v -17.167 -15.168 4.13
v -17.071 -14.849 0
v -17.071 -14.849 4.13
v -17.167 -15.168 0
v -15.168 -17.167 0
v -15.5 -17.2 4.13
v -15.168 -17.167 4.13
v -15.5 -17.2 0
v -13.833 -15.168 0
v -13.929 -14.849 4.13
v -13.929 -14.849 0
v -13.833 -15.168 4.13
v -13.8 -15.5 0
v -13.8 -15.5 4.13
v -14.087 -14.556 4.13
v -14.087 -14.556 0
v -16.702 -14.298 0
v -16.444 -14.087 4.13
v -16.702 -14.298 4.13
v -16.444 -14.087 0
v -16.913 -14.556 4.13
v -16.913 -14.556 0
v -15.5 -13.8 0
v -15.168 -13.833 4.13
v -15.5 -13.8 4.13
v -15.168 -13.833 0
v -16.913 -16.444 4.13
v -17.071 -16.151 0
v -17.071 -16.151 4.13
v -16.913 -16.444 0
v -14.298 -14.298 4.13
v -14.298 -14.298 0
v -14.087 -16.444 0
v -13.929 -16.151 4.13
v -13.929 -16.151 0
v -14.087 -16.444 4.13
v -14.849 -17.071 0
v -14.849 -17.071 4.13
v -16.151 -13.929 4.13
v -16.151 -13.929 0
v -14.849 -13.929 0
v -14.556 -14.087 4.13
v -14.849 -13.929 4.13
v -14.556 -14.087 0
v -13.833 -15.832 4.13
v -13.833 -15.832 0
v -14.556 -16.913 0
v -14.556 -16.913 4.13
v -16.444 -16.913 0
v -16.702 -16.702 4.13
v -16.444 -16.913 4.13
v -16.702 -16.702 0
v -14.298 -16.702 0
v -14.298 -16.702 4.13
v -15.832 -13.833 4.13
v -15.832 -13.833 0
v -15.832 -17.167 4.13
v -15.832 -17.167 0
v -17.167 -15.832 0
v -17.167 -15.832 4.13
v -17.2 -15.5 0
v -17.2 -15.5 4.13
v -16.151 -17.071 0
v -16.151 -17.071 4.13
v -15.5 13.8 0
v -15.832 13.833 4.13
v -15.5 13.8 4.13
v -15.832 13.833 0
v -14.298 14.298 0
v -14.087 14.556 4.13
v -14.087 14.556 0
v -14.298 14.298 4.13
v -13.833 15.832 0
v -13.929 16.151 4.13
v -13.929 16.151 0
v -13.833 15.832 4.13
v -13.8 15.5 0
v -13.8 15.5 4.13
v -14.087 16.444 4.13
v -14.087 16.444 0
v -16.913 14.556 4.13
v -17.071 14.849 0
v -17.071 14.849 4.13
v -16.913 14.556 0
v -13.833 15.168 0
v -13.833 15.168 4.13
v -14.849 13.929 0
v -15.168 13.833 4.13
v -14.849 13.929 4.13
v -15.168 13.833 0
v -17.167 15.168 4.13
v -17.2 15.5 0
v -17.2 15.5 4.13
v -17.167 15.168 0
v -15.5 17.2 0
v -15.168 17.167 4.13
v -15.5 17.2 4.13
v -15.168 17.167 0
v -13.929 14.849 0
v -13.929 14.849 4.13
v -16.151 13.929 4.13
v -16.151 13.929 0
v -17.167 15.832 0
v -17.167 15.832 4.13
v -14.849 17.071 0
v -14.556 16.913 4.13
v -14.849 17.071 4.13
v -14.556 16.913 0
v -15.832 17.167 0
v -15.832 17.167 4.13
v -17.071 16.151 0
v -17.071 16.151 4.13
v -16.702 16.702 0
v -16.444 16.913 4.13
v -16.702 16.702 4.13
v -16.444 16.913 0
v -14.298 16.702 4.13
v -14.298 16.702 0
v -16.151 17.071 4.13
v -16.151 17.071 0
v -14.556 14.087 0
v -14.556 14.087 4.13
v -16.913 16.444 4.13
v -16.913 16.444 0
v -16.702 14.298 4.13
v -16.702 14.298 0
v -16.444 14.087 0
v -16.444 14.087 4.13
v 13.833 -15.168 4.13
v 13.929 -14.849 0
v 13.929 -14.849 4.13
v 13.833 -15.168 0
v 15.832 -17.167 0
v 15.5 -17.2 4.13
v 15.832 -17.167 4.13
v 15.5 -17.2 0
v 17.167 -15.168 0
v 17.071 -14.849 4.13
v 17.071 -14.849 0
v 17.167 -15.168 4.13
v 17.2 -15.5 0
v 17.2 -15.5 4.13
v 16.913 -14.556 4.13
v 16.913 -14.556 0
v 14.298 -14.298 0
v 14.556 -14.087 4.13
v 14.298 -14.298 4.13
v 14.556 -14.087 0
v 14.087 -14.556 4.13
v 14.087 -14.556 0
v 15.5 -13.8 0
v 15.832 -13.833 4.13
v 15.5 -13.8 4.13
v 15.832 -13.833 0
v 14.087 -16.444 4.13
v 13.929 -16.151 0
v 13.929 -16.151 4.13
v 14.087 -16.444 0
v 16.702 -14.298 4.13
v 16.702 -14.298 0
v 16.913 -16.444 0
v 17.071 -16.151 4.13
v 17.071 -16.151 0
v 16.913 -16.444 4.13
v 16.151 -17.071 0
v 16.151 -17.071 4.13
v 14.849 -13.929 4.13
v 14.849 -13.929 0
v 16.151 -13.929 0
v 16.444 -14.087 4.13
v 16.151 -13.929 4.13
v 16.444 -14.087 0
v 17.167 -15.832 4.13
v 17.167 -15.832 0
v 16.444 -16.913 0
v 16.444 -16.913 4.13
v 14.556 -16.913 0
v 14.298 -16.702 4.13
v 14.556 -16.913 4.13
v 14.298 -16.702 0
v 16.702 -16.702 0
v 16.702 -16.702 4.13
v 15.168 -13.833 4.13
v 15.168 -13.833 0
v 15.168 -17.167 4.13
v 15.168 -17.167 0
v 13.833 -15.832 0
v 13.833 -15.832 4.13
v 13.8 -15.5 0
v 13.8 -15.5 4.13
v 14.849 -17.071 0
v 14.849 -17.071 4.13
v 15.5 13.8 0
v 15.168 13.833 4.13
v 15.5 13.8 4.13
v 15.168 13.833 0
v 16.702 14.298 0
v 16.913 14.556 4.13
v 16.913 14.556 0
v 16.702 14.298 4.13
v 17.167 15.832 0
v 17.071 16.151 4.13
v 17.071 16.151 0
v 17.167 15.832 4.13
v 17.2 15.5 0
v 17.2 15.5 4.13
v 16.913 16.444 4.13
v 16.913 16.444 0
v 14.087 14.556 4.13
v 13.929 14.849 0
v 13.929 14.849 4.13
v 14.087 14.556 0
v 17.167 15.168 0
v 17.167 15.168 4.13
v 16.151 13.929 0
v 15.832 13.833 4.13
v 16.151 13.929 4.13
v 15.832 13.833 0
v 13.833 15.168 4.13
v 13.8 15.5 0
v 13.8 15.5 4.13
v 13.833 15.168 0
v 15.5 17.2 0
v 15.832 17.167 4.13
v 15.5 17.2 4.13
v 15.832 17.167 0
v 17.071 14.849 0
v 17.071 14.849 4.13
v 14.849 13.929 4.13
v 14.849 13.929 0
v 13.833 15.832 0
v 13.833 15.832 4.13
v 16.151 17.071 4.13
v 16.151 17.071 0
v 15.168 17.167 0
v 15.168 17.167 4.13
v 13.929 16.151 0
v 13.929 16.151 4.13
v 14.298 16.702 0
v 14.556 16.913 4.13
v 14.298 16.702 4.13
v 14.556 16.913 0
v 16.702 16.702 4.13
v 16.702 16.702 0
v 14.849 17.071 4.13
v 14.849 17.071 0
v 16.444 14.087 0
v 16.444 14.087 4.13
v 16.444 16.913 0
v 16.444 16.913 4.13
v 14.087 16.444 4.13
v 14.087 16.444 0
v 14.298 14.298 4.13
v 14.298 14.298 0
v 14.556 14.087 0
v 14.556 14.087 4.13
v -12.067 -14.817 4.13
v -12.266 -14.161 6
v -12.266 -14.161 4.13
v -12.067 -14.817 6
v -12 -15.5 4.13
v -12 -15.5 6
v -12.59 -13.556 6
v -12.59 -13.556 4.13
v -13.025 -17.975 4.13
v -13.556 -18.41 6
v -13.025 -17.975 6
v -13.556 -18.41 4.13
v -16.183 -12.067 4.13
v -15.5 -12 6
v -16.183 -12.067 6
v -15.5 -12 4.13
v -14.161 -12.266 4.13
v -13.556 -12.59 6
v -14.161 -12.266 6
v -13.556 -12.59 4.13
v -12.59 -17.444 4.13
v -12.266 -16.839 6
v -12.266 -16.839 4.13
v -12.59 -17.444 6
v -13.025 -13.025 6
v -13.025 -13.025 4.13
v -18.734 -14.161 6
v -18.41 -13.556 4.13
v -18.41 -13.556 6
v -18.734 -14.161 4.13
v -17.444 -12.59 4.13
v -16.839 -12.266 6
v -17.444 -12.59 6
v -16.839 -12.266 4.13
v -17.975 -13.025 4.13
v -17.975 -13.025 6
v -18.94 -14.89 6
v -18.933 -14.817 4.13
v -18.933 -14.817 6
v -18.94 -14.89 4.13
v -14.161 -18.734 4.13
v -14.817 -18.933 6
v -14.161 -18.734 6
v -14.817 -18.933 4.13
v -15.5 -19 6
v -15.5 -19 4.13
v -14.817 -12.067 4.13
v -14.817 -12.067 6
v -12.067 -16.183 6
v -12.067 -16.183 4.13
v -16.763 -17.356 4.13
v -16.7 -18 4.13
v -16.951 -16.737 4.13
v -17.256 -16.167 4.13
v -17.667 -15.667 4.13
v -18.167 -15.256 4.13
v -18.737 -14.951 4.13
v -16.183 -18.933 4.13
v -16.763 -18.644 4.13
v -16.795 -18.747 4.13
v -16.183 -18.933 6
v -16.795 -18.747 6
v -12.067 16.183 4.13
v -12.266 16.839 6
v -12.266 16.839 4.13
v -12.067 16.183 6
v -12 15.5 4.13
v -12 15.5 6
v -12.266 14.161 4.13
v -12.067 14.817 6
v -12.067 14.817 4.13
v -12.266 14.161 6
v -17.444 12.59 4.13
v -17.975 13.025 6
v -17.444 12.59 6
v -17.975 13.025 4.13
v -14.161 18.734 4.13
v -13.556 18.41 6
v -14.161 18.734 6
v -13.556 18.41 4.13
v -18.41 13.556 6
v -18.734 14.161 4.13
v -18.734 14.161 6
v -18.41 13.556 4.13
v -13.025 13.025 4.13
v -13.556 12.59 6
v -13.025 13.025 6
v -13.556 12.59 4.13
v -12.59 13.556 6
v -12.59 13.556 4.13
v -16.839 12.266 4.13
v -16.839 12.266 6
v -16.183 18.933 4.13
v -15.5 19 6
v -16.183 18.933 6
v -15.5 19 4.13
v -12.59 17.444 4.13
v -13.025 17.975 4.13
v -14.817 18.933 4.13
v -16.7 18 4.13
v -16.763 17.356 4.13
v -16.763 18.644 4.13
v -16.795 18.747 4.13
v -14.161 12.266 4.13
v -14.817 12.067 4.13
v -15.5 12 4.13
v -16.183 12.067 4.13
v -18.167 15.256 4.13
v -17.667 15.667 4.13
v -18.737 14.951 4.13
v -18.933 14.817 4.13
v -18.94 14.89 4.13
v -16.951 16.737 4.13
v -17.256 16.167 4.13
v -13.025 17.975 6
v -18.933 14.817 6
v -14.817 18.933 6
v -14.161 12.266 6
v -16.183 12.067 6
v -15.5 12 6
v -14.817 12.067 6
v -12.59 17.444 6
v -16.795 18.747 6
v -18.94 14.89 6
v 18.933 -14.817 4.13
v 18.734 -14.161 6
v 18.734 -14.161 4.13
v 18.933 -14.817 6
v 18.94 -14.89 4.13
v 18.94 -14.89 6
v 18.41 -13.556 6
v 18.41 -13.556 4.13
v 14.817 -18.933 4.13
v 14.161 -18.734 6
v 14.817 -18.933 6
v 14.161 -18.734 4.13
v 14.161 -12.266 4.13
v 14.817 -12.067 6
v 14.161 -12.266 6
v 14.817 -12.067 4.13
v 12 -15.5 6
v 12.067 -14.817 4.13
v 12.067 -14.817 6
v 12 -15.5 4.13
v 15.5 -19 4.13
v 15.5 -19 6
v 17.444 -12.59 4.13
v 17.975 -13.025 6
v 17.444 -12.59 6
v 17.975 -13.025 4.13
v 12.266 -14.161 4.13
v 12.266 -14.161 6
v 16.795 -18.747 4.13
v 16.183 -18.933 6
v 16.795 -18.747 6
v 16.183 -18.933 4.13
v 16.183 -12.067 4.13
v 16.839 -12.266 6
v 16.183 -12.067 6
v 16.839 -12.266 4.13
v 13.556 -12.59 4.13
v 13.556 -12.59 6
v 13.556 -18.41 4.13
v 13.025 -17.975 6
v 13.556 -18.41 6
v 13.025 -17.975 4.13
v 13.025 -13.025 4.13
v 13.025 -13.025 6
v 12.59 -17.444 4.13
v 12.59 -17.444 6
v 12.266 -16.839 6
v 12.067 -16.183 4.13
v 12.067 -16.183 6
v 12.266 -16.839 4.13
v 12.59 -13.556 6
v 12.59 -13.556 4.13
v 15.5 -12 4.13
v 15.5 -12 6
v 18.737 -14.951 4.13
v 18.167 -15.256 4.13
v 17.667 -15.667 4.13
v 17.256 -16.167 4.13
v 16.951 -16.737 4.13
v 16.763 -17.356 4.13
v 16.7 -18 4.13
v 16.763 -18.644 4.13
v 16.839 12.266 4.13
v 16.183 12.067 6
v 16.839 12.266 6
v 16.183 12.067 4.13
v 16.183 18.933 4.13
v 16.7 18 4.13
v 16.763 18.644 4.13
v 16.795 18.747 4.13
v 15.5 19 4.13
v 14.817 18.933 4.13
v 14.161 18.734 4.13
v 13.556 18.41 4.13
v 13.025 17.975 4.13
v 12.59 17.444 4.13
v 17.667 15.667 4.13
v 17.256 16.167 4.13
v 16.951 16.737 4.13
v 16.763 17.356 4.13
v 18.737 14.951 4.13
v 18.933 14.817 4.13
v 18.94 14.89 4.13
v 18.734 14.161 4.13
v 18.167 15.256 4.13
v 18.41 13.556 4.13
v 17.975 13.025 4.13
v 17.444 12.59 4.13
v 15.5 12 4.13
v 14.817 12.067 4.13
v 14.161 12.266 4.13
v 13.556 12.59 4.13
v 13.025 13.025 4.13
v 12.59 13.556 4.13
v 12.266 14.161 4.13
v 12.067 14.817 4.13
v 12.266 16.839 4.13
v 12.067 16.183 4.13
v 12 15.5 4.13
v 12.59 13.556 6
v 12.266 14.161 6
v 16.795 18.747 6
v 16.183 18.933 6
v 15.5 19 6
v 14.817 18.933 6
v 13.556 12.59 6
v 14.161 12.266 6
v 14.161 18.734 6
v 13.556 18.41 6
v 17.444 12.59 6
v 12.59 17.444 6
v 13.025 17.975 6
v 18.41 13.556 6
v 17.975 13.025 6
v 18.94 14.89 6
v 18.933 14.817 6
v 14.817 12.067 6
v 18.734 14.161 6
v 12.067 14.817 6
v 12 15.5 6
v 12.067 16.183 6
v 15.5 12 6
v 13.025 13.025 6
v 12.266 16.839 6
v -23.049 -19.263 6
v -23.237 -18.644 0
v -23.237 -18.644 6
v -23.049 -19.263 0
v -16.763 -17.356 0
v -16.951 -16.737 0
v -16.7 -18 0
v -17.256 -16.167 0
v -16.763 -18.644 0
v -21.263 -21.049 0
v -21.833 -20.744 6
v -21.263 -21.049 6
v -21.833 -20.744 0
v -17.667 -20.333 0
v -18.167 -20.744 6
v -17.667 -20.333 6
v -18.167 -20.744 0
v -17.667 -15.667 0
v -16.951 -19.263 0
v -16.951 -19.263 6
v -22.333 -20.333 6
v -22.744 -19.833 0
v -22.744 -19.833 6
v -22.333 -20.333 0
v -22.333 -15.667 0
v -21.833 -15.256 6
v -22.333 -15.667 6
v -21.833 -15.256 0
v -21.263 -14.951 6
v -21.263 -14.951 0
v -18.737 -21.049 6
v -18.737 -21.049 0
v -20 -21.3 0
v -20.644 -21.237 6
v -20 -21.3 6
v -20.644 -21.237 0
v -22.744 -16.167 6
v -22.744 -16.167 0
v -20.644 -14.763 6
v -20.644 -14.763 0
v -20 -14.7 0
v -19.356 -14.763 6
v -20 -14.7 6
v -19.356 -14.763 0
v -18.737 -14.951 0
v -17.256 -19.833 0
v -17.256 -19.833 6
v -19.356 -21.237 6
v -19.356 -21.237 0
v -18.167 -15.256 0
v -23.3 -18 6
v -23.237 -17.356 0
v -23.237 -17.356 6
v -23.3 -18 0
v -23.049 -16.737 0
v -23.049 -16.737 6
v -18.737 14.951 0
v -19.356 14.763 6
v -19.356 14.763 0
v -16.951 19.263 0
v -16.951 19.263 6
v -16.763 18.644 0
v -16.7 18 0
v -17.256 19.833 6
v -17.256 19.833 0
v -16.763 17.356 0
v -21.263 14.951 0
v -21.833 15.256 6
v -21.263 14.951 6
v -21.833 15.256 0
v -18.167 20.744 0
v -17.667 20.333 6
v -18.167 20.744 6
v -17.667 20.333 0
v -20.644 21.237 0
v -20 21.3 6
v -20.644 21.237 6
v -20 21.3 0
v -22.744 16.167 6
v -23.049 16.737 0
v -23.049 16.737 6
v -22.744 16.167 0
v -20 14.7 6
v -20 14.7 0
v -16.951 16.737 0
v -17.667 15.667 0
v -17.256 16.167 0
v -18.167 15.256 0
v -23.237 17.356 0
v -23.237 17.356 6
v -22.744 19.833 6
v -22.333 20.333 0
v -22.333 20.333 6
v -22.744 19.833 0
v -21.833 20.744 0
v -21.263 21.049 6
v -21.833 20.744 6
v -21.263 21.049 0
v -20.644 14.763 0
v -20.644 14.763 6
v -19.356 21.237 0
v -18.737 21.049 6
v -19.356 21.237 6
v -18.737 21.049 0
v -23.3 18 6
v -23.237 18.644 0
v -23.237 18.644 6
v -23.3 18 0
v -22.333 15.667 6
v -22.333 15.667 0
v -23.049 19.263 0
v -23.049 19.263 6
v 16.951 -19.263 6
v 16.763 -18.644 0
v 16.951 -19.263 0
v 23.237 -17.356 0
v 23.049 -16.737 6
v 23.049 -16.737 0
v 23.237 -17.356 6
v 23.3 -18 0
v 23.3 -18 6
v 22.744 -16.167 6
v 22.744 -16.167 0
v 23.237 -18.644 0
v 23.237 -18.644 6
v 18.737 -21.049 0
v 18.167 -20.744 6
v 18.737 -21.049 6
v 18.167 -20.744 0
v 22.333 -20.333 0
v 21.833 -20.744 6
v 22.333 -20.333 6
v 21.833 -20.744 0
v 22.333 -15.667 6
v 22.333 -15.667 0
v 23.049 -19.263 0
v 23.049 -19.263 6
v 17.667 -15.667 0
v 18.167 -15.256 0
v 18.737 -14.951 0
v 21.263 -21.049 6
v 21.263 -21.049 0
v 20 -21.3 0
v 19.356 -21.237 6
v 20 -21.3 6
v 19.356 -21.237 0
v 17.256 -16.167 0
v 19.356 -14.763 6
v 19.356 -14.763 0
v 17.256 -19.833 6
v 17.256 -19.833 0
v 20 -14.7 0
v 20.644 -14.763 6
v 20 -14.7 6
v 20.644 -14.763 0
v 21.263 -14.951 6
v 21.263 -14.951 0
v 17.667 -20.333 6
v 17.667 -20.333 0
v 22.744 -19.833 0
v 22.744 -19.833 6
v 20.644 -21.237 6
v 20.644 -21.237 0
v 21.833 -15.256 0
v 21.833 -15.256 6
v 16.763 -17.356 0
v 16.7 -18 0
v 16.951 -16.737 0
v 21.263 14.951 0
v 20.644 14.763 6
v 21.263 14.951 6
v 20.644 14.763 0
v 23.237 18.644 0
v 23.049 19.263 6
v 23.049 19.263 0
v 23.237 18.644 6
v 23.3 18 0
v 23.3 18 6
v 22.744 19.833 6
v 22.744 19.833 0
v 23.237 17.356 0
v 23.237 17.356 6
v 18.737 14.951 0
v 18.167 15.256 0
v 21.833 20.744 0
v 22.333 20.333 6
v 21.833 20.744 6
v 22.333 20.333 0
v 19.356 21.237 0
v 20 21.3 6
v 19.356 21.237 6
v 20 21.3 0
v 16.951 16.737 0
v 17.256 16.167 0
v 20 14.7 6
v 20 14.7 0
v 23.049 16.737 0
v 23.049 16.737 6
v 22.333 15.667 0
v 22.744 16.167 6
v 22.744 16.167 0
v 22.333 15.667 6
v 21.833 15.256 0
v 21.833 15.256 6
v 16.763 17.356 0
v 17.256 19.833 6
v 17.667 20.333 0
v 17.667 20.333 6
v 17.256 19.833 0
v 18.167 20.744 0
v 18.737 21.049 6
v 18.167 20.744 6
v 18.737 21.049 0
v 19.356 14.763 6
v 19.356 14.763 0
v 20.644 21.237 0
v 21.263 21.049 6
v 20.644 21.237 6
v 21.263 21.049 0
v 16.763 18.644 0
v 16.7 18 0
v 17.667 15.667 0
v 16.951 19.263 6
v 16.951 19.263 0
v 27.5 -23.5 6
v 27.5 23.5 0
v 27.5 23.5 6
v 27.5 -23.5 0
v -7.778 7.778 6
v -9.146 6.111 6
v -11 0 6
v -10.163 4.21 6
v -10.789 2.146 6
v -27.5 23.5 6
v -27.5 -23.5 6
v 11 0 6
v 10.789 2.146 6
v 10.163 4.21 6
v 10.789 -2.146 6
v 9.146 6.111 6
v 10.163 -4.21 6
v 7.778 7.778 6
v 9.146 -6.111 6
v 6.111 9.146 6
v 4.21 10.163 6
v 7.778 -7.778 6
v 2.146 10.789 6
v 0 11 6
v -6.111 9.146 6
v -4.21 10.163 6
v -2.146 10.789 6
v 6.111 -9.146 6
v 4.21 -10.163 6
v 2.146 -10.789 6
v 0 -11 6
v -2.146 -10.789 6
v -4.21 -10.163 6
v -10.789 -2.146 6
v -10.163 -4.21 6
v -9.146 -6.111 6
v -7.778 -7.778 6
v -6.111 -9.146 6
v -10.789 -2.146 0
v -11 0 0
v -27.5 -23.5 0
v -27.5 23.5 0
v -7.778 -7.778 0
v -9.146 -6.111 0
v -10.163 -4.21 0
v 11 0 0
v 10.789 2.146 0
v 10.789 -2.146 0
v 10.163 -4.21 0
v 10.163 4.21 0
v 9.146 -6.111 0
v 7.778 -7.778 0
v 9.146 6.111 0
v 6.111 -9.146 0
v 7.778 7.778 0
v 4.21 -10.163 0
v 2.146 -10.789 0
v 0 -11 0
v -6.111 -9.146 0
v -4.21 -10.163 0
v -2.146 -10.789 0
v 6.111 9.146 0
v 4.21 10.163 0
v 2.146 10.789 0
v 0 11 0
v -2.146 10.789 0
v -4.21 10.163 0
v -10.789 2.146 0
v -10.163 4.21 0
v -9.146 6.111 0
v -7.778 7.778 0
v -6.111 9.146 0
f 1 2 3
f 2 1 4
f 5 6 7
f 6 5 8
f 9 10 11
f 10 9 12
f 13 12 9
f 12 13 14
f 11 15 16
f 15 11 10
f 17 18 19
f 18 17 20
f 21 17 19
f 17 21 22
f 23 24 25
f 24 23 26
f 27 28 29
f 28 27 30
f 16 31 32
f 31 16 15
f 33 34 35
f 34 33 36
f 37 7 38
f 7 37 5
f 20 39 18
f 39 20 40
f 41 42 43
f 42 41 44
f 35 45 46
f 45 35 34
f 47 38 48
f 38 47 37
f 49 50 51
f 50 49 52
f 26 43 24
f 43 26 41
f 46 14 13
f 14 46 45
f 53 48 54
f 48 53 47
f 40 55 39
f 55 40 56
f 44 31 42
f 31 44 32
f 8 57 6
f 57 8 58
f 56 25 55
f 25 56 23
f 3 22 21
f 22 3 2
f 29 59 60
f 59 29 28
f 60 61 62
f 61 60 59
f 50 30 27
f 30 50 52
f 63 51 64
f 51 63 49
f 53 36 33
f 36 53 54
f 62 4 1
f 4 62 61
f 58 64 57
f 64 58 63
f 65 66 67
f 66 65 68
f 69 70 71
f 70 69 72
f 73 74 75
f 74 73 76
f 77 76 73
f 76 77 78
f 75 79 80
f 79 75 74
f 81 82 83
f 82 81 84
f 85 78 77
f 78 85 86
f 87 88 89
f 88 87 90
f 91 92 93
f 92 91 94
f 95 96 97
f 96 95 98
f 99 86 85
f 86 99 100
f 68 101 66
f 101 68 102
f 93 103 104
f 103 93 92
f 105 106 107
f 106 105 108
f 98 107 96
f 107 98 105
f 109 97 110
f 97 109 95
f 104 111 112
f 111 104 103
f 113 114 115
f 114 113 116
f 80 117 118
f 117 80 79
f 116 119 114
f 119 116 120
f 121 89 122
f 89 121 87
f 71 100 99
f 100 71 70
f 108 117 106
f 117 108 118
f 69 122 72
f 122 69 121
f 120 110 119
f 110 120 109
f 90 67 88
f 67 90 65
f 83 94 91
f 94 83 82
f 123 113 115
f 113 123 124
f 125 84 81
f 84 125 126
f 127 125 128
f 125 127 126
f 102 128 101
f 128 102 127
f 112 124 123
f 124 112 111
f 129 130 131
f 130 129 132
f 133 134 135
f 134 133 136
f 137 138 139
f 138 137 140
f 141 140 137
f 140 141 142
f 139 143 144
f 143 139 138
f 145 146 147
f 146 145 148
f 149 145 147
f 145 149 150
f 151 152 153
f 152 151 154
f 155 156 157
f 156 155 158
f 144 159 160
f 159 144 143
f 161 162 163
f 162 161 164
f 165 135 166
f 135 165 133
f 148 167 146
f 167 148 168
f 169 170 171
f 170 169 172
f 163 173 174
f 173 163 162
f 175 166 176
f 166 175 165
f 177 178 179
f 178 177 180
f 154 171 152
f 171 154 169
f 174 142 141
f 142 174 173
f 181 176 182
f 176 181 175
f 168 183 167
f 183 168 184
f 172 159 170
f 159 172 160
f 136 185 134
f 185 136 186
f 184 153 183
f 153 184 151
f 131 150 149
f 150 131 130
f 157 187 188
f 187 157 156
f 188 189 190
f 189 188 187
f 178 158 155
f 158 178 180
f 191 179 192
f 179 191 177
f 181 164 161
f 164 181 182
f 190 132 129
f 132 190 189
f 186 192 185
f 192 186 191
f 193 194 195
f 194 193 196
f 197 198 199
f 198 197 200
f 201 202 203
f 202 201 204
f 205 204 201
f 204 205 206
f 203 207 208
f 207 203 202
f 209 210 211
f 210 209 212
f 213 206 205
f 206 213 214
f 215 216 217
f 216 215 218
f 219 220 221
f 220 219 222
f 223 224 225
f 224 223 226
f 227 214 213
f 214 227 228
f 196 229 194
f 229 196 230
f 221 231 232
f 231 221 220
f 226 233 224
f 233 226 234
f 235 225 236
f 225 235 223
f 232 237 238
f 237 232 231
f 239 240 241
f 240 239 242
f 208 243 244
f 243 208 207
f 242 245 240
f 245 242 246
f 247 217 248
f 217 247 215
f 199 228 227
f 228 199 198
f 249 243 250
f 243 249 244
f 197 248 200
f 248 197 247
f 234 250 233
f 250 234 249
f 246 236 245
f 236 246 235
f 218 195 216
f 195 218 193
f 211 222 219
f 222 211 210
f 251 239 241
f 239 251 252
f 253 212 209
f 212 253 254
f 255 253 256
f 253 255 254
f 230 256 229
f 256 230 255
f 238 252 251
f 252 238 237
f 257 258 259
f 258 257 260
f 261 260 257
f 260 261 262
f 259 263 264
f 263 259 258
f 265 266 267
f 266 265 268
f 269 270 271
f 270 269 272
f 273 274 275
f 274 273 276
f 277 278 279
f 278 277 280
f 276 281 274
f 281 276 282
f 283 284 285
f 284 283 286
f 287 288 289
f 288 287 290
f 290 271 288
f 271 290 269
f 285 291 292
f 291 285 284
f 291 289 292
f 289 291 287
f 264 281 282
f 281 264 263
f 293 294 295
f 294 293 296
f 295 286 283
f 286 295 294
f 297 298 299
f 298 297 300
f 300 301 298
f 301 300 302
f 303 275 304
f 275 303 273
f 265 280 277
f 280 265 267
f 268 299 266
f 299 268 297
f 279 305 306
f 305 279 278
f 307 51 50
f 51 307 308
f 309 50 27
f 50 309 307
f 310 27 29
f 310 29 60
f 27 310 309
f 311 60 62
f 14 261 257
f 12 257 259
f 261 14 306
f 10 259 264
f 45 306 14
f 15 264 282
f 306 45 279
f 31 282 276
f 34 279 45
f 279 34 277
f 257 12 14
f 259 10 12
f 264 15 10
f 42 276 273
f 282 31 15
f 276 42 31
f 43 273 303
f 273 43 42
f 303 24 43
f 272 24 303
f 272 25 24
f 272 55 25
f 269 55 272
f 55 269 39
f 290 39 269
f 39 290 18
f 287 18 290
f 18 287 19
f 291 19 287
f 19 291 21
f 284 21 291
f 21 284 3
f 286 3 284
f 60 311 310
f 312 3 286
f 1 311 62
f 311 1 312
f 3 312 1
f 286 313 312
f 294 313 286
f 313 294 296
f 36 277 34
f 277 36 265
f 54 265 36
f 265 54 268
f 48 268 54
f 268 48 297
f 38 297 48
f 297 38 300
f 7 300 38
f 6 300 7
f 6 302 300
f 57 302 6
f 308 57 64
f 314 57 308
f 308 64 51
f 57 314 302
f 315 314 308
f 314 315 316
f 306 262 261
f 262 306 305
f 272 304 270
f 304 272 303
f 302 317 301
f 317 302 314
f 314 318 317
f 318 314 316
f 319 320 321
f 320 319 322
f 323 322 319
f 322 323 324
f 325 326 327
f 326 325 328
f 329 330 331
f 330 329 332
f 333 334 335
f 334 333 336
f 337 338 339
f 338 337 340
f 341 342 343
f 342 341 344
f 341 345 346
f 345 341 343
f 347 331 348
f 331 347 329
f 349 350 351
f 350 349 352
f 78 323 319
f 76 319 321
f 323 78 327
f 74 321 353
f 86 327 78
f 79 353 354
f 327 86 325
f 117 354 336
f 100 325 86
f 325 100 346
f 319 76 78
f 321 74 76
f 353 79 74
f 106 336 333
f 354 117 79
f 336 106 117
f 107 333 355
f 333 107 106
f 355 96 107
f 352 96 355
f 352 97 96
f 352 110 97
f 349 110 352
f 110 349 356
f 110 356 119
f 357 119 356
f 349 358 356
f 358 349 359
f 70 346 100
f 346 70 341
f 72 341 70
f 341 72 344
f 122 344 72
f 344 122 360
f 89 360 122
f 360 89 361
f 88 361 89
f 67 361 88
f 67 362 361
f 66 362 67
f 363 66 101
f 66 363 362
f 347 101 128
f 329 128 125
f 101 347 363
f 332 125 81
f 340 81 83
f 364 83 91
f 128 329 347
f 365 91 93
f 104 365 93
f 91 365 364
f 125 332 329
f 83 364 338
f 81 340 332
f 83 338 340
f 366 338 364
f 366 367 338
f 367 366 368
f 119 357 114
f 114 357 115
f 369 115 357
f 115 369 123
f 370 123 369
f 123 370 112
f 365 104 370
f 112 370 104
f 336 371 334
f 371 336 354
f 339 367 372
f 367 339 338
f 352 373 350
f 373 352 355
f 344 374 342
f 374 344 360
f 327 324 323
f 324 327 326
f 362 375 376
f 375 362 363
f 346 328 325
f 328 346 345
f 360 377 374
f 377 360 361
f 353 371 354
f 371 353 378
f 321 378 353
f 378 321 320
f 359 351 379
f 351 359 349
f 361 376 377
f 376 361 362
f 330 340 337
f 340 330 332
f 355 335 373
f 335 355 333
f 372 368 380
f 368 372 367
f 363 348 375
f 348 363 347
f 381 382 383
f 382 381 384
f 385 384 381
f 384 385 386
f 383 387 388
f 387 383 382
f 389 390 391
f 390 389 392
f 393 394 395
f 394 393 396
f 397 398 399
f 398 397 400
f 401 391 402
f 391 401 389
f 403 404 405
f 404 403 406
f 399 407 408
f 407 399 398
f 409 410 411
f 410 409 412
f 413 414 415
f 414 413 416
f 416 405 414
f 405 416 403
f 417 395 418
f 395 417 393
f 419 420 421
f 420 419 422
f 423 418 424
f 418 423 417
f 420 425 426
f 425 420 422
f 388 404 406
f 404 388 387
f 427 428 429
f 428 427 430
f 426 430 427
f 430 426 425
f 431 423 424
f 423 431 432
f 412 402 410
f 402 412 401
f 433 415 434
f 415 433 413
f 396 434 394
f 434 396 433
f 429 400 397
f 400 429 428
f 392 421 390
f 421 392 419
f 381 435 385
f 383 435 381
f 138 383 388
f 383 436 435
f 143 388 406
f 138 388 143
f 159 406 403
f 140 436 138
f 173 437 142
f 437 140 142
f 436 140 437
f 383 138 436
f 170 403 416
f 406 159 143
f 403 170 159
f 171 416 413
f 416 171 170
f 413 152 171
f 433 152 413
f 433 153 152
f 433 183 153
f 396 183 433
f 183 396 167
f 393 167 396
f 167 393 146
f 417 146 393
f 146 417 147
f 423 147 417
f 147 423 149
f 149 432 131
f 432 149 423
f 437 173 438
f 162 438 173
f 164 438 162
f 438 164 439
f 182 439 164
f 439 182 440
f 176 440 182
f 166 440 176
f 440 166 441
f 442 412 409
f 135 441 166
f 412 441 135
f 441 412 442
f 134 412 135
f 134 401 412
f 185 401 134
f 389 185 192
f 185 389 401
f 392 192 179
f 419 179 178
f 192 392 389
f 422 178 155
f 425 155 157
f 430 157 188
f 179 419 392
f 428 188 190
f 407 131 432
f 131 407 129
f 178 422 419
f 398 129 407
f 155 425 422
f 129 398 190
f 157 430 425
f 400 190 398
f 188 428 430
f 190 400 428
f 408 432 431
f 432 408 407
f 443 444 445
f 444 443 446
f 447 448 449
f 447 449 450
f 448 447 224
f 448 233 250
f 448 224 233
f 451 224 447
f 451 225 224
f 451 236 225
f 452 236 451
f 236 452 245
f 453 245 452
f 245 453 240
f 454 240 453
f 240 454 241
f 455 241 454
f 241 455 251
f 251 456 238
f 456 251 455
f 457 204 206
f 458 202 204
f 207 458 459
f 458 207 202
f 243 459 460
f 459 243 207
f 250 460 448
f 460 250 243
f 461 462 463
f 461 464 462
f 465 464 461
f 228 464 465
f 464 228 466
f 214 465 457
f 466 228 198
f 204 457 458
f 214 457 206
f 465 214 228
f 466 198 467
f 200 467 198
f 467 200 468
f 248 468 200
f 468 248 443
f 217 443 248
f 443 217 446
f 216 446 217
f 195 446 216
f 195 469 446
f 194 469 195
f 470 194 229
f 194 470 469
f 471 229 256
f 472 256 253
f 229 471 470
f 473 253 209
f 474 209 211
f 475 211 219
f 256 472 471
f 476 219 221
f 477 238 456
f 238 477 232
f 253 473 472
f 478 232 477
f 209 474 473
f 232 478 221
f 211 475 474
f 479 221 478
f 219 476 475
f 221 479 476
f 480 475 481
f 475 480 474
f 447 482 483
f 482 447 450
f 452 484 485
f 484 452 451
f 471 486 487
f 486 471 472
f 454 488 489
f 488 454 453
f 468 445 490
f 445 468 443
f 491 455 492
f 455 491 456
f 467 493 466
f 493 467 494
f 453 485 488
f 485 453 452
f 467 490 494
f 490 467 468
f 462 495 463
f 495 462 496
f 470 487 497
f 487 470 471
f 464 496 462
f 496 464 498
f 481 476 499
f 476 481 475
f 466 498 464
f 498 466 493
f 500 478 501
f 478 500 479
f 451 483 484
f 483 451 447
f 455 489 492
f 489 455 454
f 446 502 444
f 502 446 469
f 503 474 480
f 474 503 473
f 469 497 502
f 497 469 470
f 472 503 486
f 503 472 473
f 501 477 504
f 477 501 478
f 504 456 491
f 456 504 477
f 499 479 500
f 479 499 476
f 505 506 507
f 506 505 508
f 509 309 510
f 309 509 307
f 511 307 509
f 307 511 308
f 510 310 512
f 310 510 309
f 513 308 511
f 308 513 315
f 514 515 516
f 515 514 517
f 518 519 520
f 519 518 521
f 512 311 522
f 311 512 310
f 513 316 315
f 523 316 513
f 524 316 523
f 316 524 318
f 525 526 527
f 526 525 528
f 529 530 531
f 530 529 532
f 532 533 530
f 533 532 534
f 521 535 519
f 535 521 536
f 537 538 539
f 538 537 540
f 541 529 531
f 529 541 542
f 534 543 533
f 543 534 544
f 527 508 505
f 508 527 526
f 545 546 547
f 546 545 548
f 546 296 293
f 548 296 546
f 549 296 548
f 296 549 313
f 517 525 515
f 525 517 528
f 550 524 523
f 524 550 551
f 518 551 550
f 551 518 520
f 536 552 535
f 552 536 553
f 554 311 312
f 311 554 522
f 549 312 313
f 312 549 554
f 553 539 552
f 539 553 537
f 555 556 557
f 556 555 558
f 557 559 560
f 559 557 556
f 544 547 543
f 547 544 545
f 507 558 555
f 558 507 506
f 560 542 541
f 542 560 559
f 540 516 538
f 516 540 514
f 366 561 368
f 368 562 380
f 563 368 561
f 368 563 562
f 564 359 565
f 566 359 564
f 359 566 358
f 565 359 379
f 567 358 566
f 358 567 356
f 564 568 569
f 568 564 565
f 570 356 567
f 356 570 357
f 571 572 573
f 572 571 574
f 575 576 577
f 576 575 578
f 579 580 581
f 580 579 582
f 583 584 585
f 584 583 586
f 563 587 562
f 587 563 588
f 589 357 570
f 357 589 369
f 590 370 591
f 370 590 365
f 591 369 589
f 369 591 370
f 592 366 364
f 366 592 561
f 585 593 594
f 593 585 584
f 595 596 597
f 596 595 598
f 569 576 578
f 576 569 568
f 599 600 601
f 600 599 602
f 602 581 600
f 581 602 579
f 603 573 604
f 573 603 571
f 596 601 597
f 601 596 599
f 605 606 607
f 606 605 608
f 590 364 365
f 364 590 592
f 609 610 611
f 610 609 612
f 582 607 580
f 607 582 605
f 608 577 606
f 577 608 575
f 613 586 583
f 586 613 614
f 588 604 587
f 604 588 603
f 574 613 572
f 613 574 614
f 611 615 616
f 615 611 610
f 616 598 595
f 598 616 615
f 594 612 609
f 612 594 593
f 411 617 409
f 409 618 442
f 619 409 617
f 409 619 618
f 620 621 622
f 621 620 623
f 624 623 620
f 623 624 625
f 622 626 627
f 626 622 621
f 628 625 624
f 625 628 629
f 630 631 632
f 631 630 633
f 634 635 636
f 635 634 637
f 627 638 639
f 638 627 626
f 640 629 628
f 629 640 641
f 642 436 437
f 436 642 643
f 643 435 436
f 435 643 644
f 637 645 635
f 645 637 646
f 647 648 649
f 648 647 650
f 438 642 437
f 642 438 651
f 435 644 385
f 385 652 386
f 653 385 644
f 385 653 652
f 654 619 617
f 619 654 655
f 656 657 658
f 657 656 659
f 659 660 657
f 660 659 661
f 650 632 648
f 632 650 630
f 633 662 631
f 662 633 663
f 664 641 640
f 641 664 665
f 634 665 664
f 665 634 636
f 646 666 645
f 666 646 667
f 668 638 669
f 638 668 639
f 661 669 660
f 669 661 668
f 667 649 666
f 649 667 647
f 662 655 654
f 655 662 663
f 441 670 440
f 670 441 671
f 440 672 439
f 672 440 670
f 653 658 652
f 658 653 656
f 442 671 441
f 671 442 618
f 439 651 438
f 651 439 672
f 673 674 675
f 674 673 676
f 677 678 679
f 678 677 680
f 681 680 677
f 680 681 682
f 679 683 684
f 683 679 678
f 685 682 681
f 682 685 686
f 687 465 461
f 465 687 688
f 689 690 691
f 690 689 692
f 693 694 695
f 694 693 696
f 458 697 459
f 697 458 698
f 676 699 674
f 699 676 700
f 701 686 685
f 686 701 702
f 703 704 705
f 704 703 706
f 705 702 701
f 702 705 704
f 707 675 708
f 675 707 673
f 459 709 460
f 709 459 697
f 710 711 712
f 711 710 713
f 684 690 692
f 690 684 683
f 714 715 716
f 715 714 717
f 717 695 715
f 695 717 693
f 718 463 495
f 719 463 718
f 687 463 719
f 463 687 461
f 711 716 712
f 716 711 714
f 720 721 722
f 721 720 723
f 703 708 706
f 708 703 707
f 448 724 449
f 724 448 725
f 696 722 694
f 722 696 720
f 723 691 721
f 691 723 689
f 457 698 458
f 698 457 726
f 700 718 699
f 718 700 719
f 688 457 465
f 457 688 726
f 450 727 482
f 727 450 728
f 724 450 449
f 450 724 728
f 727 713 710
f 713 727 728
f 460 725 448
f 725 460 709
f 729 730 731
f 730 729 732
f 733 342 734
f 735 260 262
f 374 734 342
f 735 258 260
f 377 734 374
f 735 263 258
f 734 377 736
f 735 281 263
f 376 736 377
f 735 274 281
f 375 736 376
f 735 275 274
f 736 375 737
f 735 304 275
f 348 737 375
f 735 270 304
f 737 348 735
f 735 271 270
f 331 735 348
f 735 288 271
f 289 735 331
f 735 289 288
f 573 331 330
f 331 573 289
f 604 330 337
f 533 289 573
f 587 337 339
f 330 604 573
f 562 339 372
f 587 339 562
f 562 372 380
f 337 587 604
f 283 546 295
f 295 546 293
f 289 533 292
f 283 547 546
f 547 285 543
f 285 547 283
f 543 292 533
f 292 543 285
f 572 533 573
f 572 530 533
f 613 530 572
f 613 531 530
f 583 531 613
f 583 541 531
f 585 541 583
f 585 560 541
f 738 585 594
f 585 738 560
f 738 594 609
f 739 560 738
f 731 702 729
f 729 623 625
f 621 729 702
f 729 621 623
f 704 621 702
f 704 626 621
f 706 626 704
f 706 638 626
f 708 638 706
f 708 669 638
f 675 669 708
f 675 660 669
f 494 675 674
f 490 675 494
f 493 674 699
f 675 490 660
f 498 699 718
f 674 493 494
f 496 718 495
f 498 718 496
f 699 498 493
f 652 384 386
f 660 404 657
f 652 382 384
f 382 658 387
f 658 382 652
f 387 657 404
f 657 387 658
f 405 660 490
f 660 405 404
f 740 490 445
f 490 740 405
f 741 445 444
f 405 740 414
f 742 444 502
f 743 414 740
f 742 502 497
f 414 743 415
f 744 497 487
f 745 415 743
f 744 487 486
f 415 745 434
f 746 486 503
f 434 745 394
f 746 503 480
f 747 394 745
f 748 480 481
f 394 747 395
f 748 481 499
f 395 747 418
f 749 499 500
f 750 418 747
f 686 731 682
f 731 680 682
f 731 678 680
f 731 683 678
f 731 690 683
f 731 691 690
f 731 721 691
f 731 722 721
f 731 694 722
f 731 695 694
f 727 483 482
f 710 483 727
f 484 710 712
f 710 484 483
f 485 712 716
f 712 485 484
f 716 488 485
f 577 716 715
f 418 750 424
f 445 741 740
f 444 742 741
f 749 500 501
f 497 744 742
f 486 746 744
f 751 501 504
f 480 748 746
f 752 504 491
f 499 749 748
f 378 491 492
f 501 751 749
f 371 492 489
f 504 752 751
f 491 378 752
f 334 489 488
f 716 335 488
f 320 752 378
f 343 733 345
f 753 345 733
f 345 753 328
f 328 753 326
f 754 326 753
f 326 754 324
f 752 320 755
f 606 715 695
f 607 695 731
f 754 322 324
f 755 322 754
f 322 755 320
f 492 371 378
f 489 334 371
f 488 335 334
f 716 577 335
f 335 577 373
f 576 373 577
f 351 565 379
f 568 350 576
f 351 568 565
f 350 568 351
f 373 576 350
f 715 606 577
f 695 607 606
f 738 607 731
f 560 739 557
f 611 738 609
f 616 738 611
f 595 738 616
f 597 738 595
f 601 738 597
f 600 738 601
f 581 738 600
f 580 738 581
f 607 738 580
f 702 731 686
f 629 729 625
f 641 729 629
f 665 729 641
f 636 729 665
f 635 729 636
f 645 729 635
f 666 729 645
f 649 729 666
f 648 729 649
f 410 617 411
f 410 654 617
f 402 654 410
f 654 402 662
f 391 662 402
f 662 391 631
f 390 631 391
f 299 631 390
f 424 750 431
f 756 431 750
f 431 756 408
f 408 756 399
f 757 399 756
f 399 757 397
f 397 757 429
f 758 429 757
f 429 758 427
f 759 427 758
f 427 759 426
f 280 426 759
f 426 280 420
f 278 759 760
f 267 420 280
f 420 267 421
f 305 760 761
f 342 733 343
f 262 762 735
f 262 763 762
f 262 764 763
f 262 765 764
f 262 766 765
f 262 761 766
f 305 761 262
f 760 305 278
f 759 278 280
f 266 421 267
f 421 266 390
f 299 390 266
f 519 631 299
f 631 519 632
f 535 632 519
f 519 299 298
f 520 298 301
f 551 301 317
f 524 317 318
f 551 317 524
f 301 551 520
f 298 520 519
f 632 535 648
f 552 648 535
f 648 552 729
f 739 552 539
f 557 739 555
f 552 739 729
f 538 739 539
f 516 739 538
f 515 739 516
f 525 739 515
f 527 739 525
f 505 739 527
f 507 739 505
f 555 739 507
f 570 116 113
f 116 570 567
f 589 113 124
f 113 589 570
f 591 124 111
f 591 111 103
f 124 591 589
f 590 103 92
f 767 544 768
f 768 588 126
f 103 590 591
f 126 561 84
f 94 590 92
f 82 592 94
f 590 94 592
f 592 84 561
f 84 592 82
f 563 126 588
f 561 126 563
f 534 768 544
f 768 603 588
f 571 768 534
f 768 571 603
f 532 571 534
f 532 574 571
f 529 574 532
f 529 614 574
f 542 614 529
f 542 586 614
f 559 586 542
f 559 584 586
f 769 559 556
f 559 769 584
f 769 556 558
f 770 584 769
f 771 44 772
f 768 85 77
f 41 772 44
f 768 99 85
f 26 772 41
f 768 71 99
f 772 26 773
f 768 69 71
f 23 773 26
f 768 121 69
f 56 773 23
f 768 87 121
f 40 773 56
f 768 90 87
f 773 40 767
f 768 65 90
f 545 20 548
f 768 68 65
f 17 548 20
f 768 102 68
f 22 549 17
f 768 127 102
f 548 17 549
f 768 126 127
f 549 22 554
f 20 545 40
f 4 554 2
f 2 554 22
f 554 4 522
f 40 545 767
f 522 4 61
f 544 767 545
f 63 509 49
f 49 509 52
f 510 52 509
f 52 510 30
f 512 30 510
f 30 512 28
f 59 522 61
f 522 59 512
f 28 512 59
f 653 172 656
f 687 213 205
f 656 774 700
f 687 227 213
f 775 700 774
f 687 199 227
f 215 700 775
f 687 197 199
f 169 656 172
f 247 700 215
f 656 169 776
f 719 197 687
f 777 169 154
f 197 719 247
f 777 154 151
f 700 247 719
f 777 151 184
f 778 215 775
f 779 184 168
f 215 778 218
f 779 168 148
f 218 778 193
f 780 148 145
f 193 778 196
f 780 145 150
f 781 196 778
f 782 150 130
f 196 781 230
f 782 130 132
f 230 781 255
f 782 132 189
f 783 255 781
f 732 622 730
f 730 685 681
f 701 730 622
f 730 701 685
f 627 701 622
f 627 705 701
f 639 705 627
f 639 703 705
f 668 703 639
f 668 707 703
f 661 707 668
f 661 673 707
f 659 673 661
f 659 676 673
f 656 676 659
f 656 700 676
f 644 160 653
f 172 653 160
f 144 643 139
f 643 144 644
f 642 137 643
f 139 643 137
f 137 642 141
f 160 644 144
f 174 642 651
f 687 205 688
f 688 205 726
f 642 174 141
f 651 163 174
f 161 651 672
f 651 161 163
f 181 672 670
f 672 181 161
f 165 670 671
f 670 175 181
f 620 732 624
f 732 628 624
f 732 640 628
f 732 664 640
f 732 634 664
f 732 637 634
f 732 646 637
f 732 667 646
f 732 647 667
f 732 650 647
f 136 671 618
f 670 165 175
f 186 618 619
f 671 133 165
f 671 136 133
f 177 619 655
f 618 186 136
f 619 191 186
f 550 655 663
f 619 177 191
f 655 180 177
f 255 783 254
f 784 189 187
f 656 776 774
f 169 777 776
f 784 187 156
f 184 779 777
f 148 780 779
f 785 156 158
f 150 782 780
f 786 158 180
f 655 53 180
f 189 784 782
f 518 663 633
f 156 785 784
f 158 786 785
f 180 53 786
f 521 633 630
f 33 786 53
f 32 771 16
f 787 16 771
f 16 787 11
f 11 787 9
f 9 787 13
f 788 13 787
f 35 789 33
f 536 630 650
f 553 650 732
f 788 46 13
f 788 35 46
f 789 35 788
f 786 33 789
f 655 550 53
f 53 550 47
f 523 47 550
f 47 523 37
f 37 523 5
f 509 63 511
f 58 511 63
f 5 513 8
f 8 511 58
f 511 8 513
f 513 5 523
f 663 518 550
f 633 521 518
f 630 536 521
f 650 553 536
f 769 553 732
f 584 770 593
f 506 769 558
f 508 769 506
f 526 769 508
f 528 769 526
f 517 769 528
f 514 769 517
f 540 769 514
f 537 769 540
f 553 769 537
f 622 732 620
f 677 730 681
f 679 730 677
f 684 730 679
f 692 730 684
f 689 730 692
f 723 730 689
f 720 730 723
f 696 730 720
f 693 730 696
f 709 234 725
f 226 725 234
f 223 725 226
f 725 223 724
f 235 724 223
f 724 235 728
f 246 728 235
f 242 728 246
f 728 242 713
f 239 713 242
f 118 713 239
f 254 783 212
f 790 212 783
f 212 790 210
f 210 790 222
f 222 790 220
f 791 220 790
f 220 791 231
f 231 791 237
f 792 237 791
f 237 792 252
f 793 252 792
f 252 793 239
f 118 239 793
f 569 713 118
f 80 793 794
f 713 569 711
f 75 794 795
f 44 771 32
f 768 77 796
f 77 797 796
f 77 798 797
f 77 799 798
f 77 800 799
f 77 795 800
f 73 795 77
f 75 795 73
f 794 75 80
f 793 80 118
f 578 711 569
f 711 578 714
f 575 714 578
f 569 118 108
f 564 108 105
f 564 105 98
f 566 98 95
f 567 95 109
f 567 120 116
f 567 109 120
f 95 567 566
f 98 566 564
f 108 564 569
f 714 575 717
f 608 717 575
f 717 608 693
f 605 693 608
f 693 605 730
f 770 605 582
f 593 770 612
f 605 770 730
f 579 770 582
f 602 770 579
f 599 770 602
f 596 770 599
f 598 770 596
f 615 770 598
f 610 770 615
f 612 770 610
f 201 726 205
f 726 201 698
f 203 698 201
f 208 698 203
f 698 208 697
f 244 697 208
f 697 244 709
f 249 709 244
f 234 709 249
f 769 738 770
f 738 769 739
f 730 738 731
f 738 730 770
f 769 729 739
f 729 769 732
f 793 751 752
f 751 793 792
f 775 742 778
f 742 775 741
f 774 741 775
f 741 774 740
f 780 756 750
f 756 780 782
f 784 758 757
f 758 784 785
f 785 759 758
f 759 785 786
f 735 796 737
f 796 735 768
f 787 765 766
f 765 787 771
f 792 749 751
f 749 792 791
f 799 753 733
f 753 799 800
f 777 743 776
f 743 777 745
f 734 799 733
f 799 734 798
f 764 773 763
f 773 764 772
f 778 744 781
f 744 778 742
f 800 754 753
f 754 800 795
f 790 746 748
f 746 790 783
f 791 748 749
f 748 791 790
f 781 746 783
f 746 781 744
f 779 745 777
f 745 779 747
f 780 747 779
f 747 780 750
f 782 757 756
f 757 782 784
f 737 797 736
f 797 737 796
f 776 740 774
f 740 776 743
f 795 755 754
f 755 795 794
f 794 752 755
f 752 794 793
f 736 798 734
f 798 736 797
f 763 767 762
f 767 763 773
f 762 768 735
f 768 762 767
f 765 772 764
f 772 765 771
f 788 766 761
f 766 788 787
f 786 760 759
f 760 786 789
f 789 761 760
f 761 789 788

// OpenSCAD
$fn = 32;

// ----------------------------------------------------------------------
// Motor mount plate: NEMA17, 55 x 47 x 6 mm
// ----------------------------------------------------------------------

// --- parameters (mm) ---
mount_w = 55;             // plate length, X
mount_d = 47;             // plate width, Y
mat_t = 6;                // plate thickness
motor_pitch = 31;         // NEMA17 bolt spacing
motor_d = 3.4;            // NEMA17 screw clearance
center_bore = 22;         // pilot boss bore
cb_d = 7;                 // counterbore seat
cb_h = 1.87;              // counterbore depth
second_d = 6.6;           // second fastener hole

module plate() {
  translate([-mount_w / 2, -mount_d / 2, 0]) cube([mount_w, mount_d, mat_t]);
}

module motor_holes() {
  for (sx = [-1, 1]) for (sy = [-1, 1])
    translate([sx * motor_pitch / 2, sy * motor_pitch / 2, -1])
      cylinder(h = mat_t + 2, d = motor_d);
}
module motor_counterbores() {
  for (sx = [-1, 1]) for (sy = [-1, 1])
    translate([sx * motor_pitch / 2, sy * motor_pitch / 2, mat_t - cb_h])
      cylinder(h = cb_h + 0.6, d = cb_d);
}

difference() {
  union() {
    plate();
  }
  motor_holes();
  translate([0, 0, -1]) cylinder(h = mat_t + 2, d = center_bore);
  motor_counterbores();
  for (sx = [-1, 1]) for (sy = [-1, 1])
    translate([sx * 20, sy * 18, -1]) cylinder(h = mat_t + 2, d = second_d);
}
